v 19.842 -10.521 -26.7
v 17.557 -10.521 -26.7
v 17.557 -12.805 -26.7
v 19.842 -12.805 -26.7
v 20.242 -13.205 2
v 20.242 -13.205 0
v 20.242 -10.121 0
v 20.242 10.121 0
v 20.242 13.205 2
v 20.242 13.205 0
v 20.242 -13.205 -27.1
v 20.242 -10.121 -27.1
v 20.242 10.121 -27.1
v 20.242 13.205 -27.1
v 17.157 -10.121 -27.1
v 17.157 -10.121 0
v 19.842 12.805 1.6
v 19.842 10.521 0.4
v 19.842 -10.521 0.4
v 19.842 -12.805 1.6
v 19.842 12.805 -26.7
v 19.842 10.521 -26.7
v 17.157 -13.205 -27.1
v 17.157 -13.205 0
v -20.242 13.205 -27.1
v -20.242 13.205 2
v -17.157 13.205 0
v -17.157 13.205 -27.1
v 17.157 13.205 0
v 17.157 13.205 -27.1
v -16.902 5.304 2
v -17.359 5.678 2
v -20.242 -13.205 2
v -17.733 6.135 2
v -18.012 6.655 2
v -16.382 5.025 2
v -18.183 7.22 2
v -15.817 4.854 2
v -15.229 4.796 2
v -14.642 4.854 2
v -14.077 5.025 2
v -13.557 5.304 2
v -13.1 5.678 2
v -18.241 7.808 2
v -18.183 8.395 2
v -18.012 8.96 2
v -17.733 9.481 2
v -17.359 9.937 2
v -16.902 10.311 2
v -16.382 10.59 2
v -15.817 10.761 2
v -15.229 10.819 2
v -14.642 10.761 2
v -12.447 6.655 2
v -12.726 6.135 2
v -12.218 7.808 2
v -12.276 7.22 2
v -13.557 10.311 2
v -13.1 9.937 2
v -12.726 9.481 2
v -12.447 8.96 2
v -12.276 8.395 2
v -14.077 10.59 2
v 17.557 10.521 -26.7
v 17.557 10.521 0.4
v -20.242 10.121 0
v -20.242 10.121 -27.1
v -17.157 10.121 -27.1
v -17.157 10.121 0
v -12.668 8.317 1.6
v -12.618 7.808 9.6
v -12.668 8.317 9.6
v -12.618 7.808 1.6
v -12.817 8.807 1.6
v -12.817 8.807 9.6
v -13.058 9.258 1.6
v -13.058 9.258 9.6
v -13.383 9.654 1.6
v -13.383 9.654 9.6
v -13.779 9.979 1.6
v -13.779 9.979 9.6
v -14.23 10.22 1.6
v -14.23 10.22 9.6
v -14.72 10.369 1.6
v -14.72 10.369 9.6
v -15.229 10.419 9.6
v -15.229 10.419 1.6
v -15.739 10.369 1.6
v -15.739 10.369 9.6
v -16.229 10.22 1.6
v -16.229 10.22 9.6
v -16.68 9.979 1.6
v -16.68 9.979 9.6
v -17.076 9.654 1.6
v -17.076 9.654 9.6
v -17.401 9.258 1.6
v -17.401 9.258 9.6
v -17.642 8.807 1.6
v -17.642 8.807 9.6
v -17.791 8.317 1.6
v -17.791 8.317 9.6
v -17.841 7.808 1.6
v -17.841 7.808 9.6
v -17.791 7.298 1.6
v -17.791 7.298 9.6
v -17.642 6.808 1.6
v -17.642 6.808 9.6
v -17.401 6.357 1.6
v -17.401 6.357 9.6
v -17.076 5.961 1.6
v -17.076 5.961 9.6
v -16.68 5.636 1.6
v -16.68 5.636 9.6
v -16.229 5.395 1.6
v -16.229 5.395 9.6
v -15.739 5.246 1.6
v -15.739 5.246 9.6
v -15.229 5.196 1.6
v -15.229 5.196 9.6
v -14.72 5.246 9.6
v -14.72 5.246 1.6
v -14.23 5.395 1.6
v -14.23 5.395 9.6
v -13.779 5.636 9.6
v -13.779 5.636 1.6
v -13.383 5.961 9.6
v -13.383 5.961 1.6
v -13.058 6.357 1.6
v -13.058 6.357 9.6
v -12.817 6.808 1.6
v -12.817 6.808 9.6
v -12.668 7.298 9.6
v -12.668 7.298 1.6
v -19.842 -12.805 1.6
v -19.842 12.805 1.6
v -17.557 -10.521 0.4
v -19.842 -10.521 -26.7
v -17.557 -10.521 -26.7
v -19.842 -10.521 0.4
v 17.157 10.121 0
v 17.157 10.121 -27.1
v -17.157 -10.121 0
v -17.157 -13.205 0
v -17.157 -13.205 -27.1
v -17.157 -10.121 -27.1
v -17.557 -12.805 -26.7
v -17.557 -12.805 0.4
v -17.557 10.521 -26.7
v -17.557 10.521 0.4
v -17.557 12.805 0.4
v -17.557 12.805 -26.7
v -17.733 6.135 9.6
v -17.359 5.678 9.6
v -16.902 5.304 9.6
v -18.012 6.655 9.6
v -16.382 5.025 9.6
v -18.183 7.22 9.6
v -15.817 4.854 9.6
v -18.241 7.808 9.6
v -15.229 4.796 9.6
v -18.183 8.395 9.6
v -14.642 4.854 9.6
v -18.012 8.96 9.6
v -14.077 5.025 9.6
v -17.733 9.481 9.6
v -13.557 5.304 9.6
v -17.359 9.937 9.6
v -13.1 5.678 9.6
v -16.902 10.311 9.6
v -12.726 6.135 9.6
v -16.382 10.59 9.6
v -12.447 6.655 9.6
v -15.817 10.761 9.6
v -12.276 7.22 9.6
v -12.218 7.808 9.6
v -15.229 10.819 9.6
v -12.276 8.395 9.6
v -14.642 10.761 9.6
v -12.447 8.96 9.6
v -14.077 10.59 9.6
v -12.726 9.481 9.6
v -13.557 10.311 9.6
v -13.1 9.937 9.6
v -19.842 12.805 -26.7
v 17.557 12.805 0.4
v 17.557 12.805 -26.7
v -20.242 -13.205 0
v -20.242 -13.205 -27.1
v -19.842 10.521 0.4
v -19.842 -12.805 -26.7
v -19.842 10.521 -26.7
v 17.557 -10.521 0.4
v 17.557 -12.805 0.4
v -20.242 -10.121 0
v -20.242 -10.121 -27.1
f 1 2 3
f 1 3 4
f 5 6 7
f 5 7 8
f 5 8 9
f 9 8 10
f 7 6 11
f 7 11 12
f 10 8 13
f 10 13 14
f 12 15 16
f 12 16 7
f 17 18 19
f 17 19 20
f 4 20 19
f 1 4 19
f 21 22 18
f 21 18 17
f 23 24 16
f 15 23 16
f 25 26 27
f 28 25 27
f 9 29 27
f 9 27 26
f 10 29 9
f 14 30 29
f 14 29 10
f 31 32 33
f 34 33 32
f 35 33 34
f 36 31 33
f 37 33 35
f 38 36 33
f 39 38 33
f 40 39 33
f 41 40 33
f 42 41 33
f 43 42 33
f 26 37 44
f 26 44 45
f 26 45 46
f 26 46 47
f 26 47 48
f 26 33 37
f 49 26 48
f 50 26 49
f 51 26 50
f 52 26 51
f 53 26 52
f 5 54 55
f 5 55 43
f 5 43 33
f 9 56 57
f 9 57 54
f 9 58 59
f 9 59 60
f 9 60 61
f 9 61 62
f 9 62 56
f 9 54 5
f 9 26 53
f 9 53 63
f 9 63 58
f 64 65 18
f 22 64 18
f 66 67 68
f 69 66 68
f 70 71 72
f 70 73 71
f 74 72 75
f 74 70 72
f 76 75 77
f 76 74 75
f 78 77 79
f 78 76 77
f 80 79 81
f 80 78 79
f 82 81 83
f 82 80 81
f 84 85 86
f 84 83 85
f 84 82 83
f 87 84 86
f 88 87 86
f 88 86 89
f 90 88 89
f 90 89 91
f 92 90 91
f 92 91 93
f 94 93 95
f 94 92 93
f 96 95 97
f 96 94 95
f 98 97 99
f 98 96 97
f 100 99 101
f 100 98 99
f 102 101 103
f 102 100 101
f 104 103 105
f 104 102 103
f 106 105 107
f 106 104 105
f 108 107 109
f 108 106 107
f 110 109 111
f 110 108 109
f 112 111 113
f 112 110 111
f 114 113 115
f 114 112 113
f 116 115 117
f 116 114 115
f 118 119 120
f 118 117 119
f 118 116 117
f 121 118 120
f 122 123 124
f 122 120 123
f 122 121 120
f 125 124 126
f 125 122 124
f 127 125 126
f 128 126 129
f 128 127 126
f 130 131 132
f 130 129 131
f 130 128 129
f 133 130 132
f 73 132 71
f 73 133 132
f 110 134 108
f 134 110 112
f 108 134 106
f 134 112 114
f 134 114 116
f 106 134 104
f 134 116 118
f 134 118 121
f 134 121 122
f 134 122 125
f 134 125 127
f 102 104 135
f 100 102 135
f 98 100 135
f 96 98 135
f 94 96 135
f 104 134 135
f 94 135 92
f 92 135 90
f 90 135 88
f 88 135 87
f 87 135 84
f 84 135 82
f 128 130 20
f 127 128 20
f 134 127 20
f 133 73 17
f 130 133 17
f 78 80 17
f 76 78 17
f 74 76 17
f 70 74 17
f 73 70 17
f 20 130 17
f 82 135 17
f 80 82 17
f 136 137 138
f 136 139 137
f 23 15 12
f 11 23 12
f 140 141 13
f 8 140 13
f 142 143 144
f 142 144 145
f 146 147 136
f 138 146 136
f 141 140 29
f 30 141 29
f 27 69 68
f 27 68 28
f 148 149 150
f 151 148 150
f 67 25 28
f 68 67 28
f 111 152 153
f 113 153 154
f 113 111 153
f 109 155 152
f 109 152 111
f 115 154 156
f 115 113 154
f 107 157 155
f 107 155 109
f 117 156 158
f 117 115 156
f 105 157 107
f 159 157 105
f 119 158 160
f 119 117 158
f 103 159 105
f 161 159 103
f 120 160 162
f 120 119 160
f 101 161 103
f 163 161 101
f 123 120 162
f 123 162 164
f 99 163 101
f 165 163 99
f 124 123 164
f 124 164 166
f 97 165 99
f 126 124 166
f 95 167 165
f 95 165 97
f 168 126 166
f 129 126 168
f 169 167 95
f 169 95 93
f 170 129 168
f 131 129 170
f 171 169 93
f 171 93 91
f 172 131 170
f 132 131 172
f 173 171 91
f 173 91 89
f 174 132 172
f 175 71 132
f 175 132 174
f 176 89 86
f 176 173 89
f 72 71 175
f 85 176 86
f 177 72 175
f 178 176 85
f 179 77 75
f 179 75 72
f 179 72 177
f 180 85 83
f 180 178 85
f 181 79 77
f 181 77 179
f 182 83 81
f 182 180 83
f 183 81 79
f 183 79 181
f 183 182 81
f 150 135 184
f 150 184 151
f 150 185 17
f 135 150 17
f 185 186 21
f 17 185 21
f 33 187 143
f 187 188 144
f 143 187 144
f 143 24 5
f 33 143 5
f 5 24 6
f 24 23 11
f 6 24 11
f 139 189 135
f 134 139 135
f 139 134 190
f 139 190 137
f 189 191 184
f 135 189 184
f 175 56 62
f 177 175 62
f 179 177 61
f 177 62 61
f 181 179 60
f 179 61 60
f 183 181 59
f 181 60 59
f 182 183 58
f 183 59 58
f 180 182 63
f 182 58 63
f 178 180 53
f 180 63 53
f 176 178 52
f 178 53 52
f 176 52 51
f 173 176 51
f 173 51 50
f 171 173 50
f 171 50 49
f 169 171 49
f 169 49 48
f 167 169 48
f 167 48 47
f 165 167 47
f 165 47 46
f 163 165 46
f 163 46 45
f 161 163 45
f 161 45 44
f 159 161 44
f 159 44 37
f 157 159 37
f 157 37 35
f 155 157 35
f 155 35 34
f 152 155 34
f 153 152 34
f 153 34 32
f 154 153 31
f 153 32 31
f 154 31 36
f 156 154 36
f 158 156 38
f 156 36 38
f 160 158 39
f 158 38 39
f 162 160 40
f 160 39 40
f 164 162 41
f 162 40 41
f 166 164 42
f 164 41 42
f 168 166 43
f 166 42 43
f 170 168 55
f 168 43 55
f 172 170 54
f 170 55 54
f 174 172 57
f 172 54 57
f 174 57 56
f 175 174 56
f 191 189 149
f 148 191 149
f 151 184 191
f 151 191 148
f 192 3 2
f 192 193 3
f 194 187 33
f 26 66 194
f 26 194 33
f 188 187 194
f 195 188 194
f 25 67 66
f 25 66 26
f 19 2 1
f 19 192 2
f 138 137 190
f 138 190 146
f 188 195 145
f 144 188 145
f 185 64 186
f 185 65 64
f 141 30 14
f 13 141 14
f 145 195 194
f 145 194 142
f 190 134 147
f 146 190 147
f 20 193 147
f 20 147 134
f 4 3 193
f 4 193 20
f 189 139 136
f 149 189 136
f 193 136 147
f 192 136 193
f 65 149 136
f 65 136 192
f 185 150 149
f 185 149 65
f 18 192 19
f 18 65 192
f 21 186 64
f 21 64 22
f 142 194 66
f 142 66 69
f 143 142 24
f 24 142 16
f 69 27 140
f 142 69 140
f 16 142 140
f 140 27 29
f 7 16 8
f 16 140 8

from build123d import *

# Parameters (mm, degrees)
F0_W     = 40.4834784567
F0_H     = 26.4106485993
F1_DEPTH = 2
F2_W     = 3.0844565481
F2_H     = 3.0844546854
F3_DEPTH = 29.1
F4_R     = 3.0112955683
F5_DEPTH = 9.6
F6_T     = -0.4


with BuildPart() as f1:
    # F0 (on Top) → F1 (new body)
    with BuildSketch(Plane.XY):
        Rectangle(F0_W, F0_H)
    extrude(amount=F1_DEPTH)

    # F2 (on face) → F3 (join)
    with BuildSketch(Plane.XY.offset(2)):
        with Locations((-18.6995109543, 11.6630969569)):
            Rectangle(F2_W, F2_H)
        with Locations((18.6995109543, 11.6630969569)):
            Rectangle(F2_W, F2_H)
        with Locations((18.6995109543, -11.6630969569)):
            Rectangle(F2_W, F2_H)
        with Locations((-18.6995109543, -11.6630969569)):
            Rectangle(F2_W, F2_H)
    extrude(amount=-F3_DEPTH)

    # F4 (on Top) → F5 (join)
    with BuildSketch(Plane.XY):
        with Locations((-15.2294989675, 7.8075276688)):
            Circle(F4_R)
    extrude(amount=F5_DEPTH)

    # F6
    f6_openings = [f1.faces().sort_by_distance(p)[0] for p in [
        (-15.229499, 7.807528, 9.6),
    ]]
    offset(amount=F6_T, openings=f6_openings, kind=Kind.INTERSECTION)


solid = f1.part
